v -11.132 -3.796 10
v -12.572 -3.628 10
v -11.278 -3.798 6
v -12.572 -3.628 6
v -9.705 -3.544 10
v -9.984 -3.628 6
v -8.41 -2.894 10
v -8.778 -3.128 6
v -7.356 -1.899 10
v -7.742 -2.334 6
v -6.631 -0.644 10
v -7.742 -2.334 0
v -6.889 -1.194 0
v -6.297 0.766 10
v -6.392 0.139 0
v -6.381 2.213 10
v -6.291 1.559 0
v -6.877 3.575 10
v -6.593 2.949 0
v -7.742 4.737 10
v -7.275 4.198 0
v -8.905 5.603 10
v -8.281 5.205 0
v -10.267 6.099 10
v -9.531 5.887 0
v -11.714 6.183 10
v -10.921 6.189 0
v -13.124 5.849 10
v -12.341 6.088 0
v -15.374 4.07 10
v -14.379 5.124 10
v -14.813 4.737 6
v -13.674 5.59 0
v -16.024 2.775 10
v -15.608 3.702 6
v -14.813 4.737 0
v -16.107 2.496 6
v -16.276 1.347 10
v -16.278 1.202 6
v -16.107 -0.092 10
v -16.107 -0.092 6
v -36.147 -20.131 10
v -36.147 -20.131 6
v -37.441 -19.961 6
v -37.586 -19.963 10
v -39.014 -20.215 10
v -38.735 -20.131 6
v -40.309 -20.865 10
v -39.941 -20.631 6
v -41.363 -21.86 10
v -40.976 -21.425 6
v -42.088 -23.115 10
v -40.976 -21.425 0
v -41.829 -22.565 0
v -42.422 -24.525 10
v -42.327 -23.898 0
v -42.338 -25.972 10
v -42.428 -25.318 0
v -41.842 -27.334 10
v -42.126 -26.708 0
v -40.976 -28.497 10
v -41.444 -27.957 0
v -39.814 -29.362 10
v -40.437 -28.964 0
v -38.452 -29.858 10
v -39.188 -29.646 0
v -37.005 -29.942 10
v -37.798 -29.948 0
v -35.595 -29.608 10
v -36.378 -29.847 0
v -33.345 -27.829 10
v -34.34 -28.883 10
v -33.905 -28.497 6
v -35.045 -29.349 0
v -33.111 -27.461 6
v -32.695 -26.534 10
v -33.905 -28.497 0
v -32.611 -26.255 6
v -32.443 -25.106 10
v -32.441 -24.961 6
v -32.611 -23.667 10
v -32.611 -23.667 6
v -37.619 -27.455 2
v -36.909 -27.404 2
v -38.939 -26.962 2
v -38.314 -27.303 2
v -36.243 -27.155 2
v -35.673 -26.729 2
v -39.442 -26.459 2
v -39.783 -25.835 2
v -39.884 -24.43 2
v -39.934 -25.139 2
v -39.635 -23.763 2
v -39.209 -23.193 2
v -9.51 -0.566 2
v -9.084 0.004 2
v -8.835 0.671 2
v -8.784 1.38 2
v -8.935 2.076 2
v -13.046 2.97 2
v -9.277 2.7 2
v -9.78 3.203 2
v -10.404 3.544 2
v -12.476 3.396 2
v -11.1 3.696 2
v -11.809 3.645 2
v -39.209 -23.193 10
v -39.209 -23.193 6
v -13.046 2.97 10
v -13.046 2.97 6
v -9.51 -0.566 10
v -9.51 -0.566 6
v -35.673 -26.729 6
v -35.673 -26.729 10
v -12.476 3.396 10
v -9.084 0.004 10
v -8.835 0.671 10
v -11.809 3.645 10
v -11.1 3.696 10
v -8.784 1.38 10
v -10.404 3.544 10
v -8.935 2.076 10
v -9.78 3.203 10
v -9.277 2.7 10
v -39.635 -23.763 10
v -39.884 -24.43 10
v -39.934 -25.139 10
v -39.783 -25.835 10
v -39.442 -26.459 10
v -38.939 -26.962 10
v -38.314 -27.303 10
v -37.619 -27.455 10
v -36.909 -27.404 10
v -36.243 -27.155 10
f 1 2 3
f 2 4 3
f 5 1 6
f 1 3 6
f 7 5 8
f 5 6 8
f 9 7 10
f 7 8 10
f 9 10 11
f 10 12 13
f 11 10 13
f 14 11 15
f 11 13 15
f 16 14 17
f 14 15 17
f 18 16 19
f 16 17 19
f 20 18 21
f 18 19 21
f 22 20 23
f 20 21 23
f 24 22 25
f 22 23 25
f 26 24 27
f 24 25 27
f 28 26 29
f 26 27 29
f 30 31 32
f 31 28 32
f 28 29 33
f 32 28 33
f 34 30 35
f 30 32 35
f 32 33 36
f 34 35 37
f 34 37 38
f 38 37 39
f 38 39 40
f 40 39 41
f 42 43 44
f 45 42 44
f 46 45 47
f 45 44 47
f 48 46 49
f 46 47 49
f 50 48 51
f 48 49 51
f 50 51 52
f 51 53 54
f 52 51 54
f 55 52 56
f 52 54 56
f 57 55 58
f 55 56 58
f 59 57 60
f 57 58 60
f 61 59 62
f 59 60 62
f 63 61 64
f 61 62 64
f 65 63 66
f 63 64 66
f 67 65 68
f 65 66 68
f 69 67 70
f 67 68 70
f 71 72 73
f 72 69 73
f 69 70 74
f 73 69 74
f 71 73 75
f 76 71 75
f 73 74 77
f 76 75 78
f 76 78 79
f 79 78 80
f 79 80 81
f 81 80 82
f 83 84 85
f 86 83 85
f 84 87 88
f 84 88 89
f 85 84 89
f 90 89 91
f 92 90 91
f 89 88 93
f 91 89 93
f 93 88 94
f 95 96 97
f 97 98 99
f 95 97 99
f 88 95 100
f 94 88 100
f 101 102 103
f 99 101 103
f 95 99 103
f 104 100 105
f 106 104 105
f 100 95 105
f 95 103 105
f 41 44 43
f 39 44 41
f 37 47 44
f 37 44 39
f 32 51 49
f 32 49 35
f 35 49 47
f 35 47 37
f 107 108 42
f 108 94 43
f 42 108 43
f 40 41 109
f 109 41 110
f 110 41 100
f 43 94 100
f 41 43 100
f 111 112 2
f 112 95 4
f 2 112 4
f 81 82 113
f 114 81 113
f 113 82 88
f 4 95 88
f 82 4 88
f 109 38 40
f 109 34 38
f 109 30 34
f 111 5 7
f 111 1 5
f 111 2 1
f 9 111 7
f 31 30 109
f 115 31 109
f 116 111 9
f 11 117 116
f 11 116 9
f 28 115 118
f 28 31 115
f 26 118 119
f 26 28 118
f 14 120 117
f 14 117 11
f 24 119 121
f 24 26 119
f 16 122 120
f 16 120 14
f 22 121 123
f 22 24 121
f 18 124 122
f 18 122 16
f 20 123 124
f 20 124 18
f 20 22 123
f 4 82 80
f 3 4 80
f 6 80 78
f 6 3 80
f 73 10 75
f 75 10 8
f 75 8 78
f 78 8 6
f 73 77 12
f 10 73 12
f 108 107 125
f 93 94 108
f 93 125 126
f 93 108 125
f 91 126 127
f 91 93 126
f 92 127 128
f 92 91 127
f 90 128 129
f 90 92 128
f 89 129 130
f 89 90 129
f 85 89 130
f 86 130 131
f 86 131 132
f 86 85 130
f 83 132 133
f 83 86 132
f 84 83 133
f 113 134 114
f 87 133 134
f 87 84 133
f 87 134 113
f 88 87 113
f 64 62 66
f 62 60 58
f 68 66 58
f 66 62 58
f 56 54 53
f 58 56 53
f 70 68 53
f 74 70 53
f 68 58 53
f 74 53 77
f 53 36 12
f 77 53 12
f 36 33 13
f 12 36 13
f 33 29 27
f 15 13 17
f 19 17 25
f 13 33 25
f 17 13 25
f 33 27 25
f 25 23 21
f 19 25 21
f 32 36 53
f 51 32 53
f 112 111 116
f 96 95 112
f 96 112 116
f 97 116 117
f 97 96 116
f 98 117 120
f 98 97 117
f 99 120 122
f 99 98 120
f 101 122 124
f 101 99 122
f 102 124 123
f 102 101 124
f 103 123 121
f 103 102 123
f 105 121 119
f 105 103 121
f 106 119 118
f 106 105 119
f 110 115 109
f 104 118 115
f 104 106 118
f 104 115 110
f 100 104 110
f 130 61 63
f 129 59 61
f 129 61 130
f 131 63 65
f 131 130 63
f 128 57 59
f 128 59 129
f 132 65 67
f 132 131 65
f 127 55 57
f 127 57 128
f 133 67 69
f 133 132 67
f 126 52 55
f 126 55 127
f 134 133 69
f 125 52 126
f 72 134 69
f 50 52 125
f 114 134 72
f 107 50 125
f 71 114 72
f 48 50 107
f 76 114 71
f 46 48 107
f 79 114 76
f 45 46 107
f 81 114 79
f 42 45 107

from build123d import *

# Parameters (mm, degrees)
SKETCH_1_R          = 5
SKETCH_1_R_2        = 2.5
EXTRUDE_1_DEPTH     = 10
EXTRUDE_1_2_DEPTH   = 10
EXTRUDE_2_DEPTH     = 6
CUT_EXTRUDE_1_DEPTH = 4
SKETCH_5_R          = 2.5
EXTRUDE_3_DEPTH     = 2
CUT_EXTRUDE_2_DEPTH = 4


with BuildPart() as part:
    # Эскиз1 → Бобышка-Вытянуть1 (new body)
    with BuildSketch(Plane.XY):
        with Locations((-11.277859903, 1.201925786)):
            Circle(SKETCH_1_R)
        with Locations((-11.277859903, 1.201925786)):
            Circle(SKETCH_1_R_2, mode=Mode.SUBTRACT)
    extrude(amount=EXTRUDE_1_DEPTH)



with BuildPart() as body_2:
    # Эскиз1 → Extrude 1 2 (new body)
    with BuildSketch(Plane.XY):
        with Locations((-37.440810807, -24.961025118)):
            Circle(SKETCH_1_R)
        with Locations((-37.440810807, -24.961025118)):
            Circle(SKETCH_1_R_2, mode=Mode.SUBTRACT)
    extrude(amount=EXTRUDE_1_2_DEPTH)


with BuildPart() as part_1:
    add(part.part)

    add(body_2.part)  # Бобышка-Вытянуть2 merges body 2
    # Эскиз3 → Бобышка-Вытянуть2 (add)
    with BuildSketch(Plane(origin=(0, 0, 0), x_dir=(-1, 0, 0), z_dir=(0, 0, -1))):
        Polygon((11.277859903, 1.201925786), (14.813393809, 4.737459692), (40.976344713, -21.425491212), (33.905276901, -28.496559024), (7.742325997, -2.33360812), align=None)
    extrude(amount=-EXTRUDE_2_DEPTH)

    # Эскиз4 → Вырез-Вытянуть1 (cut)
    with BuildSketch(Plane.XY.offset(6)):
        Polygon((-13.045626856, 2.969692739), (-9.51009295, -0.565841167), (-35.673043854, -26.728792071), (-39.20857776, -23.193258165), align=None)
    extrude(amount=-CUT_EXTRUDE_1_DEPTH, mode=Mode.SUBTRACT)

    # Эскиз5 → Бобышка-Вытянуть3 (add)
    with BuildSketch(Plane(origin=(0, 0, 0), x_dir=(-1, 0, 0), z_dir=(0, 0, -1))):
        with Locations((11.277859903, 1.201925786)):
            Circle(SKETCH_5_R)
        with Locations((37.440810807, -24.961025118)):
            Circle(SKETCH_5_R)
    extrude(amount=-EXTRUDE_3_DEPTH)

    # Эскиз4<2> → Вырез-Вытянуть2 (cut)
    with BuildSketch(Plane.XY.offset(6)):
        Polygon((-13.045626856, 2.969692739), (-9.51009295, -0.565841167), (-35.673043854, -26.728792071), (-39.20857776, -23.193258165), align=None)
    extrude(amount=CUT_EXTRUDE_2_DEPTH, mode=Mode.SUBTRACT)


solid = part_1.part
